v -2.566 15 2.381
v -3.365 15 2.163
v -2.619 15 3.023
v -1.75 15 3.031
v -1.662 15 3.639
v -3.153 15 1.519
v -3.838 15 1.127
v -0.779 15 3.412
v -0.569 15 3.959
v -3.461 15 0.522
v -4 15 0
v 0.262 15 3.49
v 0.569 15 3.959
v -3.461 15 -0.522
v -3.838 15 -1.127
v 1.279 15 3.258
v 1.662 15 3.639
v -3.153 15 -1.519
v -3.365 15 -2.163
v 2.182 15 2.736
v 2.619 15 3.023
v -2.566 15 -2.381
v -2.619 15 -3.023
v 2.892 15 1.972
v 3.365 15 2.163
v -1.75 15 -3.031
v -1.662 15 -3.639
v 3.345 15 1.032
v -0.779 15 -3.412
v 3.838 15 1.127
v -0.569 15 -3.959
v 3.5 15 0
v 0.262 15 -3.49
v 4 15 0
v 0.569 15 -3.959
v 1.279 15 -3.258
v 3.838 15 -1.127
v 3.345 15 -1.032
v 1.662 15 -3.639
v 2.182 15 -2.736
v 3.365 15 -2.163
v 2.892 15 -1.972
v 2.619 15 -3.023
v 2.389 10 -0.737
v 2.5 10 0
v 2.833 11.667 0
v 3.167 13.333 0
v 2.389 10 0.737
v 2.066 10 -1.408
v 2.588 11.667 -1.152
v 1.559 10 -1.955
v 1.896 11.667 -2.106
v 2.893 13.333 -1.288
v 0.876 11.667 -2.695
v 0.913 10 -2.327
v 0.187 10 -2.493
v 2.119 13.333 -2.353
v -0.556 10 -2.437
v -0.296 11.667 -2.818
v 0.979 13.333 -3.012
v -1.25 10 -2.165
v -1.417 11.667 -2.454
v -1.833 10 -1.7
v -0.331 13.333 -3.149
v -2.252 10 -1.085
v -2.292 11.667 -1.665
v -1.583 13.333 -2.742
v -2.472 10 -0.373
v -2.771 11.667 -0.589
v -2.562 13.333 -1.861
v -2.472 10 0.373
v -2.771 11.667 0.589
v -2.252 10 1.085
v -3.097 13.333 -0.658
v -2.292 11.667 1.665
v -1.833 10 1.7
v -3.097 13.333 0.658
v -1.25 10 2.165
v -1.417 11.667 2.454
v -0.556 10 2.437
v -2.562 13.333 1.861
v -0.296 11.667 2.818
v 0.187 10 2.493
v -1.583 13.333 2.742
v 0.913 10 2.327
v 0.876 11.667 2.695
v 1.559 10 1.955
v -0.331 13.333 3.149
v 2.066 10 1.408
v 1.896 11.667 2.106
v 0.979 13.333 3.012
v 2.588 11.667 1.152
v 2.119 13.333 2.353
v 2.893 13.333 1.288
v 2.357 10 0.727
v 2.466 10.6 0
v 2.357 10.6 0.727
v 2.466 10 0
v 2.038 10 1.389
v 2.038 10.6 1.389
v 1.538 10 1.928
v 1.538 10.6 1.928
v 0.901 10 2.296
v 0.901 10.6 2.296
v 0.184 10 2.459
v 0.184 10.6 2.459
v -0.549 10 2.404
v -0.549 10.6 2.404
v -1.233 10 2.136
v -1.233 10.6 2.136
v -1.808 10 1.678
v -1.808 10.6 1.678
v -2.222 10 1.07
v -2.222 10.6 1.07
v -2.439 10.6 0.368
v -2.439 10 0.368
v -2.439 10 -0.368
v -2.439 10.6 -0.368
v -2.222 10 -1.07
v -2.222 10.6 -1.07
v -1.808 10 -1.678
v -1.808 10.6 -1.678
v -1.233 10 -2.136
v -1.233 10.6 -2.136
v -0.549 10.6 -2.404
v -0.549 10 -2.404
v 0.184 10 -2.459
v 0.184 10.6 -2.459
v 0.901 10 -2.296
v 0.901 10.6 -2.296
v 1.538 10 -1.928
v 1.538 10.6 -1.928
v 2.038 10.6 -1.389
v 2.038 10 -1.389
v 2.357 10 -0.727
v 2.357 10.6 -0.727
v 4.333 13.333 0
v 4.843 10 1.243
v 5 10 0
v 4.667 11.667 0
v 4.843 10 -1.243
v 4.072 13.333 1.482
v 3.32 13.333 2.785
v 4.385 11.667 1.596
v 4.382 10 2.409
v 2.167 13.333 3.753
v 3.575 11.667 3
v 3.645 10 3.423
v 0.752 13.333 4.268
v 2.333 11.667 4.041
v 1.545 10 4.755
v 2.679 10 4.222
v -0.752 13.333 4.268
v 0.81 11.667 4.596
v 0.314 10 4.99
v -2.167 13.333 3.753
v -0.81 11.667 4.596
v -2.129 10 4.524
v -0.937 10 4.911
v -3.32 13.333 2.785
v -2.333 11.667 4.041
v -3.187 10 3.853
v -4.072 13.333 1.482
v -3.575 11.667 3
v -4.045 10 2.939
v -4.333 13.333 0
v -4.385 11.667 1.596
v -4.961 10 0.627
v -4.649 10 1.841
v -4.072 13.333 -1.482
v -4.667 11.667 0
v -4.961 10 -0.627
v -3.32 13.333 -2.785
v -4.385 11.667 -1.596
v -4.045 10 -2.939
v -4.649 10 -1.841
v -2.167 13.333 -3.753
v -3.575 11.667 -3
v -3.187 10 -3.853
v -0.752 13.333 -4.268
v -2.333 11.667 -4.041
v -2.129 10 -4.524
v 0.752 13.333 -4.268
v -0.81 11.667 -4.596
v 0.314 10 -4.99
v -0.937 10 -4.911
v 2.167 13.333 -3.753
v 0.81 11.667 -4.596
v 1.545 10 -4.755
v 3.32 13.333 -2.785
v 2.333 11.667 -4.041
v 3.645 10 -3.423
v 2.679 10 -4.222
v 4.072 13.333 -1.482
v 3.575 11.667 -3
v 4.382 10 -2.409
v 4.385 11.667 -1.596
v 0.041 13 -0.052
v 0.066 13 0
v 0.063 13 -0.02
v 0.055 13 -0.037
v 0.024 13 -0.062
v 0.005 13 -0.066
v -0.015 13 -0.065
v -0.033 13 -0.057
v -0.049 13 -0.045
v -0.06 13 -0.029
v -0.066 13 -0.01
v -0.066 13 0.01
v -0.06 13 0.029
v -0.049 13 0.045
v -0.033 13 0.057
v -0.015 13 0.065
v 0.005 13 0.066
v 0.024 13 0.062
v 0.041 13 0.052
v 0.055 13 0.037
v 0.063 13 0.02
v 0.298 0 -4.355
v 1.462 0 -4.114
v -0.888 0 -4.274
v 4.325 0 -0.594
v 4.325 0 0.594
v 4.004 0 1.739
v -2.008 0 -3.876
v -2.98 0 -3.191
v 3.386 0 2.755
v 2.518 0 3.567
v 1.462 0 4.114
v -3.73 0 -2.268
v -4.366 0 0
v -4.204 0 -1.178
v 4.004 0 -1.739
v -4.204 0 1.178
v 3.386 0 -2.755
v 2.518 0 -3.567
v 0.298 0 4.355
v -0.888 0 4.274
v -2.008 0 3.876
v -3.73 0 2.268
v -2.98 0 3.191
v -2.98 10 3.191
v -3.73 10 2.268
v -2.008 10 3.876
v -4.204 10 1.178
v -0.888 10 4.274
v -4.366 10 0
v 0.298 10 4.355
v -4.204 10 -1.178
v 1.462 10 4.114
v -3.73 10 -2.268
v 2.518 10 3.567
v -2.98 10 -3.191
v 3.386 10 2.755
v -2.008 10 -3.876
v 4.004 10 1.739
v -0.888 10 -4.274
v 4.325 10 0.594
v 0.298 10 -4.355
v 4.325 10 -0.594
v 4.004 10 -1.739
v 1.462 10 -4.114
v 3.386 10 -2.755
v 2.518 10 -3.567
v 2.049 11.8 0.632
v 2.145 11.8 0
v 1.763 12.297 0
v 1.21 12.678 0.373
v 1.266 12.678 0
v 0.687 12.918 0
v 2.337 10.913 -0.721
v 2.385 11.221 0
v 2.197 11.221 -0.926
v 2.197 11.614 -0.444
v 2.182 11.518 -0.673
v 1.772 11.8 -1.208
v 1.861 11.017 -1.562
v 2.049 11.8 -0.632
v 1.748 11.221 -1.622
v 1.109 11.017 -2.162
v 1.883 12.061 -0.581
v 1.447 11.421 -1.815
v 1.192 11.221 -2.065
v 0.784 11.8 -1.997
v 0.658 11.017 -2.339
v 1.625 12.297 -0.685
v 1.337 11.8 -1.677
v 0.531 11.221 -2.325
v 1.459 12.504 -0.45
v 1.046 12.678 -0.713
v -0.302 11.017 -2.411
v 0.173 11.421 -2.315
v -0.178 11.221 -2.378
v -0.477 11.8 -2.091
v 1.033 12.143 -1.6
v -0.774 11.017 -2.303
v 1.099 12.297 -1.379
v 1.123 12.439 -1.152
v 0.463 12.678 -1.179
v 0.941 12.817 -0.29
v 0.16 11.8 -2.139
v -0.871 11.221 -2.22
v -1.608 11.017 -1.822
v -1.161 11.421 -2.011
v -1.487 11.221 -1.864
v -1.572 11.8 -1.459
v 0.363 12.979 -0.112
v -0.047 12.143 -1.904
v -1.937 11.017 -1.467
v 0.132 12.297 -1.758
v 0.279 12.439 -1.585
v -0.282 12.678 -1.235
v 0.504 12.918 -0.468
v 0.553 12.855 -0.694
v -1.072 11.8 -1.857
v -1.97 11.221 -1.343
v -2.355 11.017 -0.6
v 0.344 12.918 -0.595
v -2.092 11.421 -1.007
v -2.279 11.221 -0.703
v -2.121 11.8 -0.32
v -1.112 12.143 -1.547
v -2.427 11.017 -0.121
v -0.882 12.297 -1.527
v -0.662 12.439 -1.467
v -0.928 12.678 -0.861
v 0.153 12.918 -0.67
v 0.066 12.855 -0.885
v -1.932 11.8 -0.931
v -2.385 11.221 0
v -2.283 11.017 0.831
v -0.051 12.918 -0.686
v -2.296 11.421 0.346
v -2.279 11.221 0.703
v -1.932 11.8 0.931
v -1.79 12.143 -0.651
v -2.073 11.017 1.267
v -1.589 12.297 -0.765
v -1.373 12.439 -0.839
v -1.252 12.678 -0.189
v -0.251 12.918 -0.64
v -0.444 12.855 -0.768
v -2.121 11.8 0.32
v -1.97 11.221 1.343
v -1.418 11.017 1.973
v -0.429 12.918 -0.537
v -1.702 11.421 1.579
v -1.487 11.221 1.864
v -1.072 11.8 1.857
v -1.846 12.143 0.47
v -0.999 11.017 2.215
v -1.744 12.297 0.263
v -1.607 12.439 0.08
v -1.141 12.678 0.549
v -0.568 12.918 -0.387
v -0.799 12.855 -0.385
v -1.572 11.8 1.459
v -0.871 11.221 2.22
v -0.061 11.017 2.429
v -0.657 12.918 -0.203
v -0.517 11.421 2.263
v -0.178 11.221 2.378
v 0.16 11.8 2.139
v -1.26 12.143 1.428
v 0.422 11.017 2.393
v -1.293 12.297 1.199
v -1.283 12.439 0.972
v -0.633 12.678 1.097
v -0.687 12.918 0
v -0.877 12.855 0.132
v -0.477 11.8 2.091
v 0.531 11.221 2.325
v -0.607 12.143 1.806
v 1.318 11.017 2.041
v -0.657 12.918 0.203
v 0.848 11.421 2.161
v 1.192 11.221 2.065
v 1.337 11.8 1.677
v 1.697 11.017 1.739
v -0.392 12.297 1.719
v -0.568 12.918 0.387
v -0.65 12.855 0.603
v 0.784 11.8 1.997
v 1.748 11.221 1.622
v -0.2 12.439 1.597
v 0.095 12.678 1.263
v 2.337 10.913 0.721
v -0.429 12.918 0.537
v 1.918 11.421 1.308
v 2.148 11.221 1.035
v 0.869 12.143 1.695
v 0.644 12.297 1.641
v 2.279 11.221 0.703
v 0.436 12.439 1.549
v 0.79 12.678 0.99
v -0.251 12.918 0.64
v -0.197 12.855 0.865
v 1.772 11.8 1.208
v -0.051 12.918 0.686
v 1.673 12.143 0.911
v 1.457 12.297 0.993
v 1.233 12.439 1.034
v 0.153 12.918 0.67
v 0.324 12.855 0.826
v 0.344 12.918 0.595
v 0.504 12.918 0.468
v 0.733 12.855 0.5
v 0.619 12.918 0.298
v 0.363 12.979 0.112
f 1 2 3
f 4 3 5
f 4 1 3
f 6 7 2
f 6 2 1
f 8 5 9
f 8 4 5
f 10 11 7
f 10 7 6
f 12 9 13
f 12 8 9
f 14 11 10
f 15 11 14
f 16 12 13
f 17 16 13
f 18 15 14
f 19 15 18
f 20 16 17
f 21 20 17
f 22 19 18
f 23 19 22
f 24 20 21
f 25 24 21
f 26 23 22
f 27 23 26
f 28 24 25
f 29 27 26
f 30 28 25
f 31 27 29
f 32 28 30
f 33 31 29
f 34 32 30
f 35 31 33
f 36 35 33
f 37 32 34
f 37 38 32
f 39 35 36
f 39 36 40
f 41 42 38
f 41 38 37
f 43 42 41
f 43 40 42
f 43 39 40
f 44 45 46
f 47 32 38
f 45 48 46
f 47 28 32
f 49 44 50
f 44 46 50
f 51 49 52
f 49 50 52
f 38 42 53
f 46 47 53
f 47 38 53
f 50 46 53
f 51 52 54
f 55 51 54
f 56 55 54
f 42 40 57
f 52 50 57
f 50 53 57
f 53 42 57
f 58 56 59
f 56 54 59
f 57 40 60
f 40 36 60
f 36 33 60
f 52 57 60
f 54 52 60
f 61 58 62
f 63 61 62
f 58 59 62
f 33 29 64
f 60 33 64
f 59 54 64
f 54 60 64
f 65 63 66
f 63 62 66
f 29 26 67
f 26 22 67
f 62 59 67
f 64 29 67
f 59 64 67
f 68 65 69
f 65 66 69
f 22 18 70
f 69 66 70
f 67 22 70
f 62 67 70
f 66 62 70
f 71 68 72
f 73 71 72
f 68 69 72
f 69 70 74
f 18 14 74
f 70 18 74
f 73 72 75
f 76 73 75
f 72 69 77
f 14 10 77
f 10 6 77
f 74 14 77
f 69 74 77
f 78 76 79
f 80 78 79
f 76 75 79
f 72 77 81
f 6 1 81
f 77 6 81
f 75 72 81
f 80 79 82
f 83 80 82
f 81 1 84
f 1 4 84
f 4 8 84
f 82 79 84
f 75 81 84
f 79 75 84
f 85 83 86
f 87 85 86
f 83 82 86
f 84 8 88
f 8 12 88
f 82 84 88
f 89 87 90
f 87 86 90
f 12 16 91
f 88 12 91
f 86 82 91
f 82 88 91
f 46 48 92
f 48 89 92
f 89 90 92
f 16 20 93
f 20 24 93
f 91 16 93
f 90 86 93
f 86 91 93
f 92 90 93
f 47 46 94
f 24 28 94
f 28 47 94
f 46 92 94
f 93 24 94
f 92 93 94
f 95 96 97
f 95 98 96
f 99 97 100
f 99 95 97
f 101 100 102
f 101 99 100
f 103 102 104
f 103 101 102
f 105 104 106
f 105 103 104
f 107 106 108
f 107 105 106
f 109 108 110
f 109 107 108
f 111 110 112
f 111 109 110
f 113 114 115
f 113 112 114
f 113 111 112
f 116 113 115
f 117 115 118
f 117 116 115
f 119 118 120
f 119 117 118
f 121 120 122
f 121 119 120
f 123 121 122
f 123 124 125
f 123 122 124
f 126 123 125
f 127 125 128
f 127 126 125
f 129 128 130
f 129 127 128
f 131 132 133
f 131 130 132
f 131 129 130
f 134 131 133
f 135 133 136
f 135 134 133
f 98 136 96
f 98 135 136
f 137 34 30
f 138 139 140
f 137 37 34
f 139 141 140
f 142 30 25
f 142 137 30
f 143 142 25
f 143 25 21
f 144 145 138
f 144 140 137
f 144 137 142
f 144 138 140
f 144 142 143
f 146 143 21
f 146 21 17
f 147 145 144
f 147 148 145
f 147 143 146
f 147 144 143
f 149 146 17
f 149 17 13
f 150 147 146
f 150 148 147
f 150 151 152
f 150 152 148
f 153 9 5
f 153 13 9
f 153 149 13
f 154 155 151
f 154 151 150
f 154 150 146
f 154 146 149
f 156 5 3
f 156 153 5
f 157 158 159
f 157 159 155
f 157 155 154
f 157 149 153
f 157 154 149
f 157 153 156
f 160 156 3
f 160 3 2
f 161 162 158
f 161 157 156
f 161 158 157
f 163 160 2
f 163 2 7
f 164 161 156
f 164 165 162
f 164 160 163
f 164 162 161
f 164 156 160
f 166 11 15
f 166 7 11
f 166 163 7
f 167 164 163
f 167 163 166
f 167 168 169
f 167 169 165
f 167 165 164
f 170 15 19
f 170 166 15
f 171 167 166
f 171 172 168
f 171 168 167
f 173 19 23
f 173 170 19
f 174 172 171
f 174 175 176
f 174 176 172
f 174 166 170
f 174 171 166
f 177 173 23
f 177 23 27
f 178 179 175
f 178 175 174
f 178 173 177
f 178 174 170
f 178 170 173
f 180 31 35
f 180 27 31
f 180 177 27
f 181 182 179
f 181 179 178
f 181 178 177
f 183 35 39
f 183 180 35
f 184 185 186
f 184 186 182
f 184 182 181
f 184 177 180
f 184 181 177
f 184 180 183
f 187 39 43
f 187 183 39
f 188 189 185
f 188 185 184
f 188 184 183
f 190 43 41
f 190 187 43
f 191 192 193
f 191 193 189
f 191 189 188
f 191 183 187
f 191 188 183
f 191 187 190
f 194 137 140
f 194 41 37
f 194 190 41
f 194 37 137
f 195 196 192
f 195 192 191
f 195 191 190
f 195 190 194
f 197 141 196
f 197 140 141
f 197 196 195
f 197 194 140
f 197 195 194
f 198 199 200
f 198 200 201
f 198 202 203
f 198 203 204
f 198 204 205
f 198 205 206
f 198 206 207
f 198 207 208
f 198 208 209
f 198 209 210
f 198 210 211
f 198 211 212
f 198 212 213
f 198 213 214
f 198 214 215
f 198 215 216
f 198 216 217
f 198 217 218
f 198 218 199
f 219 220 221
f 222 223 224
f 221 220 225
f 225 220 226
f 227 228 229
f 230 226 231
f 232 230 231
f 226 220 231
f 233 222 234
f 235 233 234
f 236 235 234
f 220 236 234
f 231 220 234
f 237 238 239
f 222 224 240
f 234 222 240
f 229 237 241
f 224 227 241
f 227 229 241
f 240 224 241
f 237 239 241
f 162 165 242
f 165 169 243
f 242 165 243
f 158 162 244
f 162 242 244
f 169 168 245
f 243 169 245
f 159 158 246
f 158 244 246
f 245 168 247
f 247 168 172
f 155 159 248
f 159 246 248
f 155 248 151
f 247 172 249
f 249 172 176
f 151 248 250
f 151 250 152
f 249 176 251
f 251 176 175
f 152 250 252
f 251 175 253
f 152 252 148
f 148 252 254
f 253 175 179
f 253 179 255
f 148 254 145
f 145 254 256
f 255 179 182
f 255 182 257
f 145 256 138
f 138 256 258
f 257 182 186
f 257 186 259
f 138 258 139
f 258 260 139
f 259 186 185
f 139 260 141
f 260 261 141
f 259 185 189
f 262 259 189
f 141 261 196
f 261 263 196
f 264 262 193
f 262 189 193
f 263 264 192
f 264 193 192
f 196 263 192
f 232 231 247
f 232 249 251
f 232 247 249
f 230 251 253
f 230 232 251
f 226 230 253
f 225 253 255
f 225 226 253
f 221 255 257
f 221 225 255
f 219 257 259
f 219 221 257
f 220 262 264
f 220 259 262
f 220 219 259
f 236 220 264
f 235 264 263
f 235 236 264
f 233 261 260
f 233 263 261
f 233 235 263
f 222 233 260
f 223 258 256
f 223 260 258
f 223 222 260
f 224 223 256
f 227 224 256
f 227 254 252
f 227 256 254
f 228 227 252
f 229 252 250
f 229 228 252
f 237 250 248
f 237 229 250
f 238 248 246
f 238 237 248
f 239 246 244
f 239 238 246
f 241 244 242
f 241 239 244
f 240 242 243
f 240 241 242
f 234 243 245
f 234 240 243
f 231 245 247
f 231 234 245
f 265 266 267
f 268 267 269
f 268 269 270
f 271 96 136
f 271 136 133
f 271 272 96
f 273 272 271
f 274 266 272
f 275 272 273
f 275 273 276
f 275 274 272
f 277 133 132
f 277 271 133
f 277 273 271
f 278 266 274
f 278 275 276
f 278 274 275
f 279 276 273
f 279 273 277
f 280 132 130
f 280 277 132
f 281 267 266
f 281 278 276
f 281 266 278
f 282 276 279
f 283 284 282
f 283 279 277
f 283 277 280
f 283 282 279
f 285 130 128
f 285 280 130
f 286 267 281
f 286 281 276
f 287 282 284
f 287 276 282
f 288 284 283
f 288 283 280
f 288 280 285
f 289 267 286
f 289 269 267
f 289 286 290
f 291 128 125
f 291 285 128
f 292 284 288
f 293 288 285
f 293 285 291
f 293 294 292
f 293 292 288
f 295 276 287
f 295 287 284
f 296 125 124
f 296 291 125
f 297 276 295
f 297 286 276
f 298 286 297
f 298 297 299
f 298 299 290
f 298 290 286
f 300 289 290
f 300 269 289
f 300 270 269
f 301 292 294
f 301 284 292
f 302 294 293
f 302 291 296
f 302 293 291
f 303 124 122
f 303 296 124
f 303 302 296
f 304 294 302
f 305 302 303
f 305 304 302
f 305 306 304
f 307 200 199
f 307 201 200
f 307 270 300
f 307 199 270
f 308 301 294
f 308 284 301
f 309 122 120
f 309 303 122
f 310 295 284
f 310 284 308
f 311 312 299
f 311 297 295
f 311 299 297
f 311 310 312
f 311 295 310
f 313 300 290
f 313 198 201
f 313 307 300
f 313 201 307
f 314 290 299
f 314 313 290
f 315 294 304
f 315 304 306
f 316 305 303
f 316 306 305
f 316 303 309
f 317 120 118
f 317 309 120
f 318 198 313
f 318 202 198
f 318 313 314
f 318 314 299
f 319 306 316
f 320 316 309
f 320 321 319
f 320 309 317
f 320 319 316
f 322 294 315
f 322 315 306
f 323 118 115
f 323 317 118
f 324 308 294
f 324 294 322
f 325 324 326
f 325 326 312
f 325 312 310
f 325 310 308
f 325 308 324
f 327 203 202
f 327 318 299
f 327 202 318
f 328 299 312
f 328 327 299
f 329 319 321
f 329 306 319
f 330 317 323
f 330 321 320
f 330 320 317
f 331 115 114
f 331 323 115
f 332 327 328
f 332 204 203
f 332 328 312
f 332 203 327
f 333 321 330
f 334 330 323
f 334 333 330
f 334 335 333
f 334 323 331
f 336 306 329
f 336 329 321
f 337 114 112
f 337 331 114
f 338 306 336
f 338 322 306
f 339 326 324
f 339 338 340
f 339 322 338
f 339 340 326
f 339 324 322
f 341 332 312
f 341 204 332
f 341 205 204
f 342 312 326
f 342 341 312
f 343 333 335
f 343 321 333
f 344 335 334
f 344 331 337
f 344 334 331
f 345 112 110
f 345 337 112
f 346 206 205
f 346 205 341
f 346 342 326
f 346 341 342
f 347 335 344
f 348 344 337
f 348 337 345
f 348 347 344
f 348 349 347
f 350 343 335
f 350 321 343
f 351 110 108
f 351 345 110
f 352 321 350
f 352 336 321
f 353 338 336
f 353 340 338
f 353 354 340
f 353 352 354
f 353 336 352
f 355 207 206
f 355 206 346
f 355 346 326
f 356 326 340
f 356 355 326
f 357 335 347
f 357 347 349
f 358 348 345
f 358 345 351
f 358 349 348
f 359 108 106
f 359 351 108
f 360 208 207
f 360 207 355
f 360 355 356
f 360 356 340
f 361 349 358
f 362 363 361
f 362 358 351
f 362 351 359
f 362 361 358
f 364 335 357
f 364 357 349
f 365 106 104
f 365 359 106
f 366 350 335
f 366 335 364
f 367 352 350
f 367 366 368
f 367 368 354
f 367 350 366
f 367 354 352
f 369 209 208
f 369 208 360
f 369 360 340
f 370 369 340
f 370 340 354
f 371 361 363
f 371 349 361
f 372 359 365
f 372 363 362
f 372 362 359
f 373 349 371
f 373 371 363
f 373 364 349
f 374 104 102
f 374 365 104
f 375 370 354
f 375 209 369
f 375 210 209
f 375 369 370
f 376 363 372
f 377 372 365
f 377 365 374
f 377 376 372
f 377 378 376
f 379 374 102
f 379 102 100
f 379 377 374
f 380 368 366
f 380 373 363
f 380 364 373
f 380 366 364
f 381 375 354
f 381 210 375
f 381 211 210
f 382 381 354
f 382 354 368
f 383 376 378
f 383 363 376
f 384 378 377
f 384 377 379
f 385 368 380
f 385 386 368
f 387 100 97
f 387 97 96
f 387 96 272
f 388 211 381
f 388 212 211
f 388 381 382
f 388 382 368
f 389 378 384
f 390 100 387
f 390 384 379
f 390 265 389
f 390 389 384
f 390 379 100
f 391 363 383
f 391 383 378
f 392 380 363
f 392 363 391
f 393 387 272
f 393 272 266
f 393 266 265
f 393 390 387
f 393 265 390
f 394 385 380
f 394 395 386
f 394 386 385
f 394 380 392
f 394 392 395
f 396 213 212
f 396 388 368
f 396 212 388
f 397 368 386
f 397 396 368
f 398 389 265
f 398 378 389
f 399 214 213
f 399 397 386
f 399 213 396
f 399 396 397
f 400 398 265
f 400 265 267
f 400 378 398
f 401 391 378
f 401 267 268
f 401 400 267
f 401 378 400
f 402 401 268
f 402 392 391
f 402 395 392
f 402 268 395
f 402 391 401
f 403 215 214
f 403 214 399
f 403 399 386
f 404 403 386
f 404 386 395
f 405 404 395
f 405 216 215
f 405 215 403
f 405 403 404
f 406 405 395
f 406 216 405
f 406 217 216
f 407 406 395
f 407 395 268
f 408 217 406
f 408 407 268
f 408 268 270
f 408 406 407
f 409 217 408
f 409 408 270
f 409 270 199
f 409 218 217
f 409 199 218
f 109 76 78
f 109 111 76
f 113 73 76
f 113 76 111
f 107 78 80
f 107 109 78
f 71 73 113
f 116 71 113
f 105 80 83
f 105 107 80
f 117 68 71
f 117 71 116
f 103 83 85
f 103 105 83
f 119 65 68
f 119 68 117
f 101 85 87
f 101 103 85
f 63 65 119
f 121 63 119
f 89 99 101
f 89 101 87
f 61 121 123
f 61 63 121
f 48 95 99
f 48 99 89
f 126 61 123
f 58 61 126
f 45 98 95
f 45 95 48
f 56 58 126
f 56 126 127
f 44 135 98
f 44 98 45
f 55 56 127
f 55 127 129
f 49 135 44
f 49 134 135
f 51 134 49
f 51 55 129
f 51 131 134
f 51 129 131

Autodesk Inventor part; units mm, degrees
ref_plane "YZ Plane" through (0, 0, 0) normal (1, 0, 0) x (0, 1, 0)
sketch "Sketch1" plane through (0, 0, 0) normal (0, 1, 0) x (-1, 0, 0)
  circle A0 centre (0, 0) radius 4.3656
  dimension "d0" = 8.7312
extrude "Extrusion1" add sketch "Sketch1" along normal blind 10
thread "Thread1" size "M9x1.25" class "6g" standard "ANSI Metric M Profile" full length
sketch "Sketch2" plane through (0, 10, 0) normal (0, 1, 0) x (1, 0, 0)
  circle A0 centre (0, 0) radius 5
  dimension "d5" = 10
ref_plane "Work Plane1" through (0, 15, 0) normal (0, 1, 0) x (1, 0, 0)
sketch "Sketch3" plane through (0, 15, 0) normal (0, 1, 0) x (1, 0, 0)
  circle A0 centre (0, 0) radius 4
  dimension "d7" = 8
loft "Loft1" add profiles "Sketch2", "Sketch3"
sketch "Sketch4" plane through (0, 15, 0) normal (0, 1, 0) x (1, 0, 0)
  circle A0 centre (0, 0) radius 3.5
  dimension "d12" = 7
ref_plane "Work Plane2" through (0, 10, 0) normal (0, 1, 0) x (1, 0, 0)
sketch "Sketch5" plane through (0, 10, 0) normal (0, 1, 0) x (1, 0, 0)
  circle A0 centre (0, 0) radius 2.5
  dimension "d14" = 5
loft "Loft2" cut profiles "Sketch5", "Sketch4"
sketch "Sketch6" plane through (0, 10, 0) normal (0, 1, 0) x (1, 0, 0)
  circle A0 centre (0, 0) radius 2.4663
extrude "Extrusion2" add sketch "Sketch6" along normal blind 3
fillet "Fillet1" radius 2.4 1 edges at (-2.4663, 13, 0)
properties part number "LED Holder"
